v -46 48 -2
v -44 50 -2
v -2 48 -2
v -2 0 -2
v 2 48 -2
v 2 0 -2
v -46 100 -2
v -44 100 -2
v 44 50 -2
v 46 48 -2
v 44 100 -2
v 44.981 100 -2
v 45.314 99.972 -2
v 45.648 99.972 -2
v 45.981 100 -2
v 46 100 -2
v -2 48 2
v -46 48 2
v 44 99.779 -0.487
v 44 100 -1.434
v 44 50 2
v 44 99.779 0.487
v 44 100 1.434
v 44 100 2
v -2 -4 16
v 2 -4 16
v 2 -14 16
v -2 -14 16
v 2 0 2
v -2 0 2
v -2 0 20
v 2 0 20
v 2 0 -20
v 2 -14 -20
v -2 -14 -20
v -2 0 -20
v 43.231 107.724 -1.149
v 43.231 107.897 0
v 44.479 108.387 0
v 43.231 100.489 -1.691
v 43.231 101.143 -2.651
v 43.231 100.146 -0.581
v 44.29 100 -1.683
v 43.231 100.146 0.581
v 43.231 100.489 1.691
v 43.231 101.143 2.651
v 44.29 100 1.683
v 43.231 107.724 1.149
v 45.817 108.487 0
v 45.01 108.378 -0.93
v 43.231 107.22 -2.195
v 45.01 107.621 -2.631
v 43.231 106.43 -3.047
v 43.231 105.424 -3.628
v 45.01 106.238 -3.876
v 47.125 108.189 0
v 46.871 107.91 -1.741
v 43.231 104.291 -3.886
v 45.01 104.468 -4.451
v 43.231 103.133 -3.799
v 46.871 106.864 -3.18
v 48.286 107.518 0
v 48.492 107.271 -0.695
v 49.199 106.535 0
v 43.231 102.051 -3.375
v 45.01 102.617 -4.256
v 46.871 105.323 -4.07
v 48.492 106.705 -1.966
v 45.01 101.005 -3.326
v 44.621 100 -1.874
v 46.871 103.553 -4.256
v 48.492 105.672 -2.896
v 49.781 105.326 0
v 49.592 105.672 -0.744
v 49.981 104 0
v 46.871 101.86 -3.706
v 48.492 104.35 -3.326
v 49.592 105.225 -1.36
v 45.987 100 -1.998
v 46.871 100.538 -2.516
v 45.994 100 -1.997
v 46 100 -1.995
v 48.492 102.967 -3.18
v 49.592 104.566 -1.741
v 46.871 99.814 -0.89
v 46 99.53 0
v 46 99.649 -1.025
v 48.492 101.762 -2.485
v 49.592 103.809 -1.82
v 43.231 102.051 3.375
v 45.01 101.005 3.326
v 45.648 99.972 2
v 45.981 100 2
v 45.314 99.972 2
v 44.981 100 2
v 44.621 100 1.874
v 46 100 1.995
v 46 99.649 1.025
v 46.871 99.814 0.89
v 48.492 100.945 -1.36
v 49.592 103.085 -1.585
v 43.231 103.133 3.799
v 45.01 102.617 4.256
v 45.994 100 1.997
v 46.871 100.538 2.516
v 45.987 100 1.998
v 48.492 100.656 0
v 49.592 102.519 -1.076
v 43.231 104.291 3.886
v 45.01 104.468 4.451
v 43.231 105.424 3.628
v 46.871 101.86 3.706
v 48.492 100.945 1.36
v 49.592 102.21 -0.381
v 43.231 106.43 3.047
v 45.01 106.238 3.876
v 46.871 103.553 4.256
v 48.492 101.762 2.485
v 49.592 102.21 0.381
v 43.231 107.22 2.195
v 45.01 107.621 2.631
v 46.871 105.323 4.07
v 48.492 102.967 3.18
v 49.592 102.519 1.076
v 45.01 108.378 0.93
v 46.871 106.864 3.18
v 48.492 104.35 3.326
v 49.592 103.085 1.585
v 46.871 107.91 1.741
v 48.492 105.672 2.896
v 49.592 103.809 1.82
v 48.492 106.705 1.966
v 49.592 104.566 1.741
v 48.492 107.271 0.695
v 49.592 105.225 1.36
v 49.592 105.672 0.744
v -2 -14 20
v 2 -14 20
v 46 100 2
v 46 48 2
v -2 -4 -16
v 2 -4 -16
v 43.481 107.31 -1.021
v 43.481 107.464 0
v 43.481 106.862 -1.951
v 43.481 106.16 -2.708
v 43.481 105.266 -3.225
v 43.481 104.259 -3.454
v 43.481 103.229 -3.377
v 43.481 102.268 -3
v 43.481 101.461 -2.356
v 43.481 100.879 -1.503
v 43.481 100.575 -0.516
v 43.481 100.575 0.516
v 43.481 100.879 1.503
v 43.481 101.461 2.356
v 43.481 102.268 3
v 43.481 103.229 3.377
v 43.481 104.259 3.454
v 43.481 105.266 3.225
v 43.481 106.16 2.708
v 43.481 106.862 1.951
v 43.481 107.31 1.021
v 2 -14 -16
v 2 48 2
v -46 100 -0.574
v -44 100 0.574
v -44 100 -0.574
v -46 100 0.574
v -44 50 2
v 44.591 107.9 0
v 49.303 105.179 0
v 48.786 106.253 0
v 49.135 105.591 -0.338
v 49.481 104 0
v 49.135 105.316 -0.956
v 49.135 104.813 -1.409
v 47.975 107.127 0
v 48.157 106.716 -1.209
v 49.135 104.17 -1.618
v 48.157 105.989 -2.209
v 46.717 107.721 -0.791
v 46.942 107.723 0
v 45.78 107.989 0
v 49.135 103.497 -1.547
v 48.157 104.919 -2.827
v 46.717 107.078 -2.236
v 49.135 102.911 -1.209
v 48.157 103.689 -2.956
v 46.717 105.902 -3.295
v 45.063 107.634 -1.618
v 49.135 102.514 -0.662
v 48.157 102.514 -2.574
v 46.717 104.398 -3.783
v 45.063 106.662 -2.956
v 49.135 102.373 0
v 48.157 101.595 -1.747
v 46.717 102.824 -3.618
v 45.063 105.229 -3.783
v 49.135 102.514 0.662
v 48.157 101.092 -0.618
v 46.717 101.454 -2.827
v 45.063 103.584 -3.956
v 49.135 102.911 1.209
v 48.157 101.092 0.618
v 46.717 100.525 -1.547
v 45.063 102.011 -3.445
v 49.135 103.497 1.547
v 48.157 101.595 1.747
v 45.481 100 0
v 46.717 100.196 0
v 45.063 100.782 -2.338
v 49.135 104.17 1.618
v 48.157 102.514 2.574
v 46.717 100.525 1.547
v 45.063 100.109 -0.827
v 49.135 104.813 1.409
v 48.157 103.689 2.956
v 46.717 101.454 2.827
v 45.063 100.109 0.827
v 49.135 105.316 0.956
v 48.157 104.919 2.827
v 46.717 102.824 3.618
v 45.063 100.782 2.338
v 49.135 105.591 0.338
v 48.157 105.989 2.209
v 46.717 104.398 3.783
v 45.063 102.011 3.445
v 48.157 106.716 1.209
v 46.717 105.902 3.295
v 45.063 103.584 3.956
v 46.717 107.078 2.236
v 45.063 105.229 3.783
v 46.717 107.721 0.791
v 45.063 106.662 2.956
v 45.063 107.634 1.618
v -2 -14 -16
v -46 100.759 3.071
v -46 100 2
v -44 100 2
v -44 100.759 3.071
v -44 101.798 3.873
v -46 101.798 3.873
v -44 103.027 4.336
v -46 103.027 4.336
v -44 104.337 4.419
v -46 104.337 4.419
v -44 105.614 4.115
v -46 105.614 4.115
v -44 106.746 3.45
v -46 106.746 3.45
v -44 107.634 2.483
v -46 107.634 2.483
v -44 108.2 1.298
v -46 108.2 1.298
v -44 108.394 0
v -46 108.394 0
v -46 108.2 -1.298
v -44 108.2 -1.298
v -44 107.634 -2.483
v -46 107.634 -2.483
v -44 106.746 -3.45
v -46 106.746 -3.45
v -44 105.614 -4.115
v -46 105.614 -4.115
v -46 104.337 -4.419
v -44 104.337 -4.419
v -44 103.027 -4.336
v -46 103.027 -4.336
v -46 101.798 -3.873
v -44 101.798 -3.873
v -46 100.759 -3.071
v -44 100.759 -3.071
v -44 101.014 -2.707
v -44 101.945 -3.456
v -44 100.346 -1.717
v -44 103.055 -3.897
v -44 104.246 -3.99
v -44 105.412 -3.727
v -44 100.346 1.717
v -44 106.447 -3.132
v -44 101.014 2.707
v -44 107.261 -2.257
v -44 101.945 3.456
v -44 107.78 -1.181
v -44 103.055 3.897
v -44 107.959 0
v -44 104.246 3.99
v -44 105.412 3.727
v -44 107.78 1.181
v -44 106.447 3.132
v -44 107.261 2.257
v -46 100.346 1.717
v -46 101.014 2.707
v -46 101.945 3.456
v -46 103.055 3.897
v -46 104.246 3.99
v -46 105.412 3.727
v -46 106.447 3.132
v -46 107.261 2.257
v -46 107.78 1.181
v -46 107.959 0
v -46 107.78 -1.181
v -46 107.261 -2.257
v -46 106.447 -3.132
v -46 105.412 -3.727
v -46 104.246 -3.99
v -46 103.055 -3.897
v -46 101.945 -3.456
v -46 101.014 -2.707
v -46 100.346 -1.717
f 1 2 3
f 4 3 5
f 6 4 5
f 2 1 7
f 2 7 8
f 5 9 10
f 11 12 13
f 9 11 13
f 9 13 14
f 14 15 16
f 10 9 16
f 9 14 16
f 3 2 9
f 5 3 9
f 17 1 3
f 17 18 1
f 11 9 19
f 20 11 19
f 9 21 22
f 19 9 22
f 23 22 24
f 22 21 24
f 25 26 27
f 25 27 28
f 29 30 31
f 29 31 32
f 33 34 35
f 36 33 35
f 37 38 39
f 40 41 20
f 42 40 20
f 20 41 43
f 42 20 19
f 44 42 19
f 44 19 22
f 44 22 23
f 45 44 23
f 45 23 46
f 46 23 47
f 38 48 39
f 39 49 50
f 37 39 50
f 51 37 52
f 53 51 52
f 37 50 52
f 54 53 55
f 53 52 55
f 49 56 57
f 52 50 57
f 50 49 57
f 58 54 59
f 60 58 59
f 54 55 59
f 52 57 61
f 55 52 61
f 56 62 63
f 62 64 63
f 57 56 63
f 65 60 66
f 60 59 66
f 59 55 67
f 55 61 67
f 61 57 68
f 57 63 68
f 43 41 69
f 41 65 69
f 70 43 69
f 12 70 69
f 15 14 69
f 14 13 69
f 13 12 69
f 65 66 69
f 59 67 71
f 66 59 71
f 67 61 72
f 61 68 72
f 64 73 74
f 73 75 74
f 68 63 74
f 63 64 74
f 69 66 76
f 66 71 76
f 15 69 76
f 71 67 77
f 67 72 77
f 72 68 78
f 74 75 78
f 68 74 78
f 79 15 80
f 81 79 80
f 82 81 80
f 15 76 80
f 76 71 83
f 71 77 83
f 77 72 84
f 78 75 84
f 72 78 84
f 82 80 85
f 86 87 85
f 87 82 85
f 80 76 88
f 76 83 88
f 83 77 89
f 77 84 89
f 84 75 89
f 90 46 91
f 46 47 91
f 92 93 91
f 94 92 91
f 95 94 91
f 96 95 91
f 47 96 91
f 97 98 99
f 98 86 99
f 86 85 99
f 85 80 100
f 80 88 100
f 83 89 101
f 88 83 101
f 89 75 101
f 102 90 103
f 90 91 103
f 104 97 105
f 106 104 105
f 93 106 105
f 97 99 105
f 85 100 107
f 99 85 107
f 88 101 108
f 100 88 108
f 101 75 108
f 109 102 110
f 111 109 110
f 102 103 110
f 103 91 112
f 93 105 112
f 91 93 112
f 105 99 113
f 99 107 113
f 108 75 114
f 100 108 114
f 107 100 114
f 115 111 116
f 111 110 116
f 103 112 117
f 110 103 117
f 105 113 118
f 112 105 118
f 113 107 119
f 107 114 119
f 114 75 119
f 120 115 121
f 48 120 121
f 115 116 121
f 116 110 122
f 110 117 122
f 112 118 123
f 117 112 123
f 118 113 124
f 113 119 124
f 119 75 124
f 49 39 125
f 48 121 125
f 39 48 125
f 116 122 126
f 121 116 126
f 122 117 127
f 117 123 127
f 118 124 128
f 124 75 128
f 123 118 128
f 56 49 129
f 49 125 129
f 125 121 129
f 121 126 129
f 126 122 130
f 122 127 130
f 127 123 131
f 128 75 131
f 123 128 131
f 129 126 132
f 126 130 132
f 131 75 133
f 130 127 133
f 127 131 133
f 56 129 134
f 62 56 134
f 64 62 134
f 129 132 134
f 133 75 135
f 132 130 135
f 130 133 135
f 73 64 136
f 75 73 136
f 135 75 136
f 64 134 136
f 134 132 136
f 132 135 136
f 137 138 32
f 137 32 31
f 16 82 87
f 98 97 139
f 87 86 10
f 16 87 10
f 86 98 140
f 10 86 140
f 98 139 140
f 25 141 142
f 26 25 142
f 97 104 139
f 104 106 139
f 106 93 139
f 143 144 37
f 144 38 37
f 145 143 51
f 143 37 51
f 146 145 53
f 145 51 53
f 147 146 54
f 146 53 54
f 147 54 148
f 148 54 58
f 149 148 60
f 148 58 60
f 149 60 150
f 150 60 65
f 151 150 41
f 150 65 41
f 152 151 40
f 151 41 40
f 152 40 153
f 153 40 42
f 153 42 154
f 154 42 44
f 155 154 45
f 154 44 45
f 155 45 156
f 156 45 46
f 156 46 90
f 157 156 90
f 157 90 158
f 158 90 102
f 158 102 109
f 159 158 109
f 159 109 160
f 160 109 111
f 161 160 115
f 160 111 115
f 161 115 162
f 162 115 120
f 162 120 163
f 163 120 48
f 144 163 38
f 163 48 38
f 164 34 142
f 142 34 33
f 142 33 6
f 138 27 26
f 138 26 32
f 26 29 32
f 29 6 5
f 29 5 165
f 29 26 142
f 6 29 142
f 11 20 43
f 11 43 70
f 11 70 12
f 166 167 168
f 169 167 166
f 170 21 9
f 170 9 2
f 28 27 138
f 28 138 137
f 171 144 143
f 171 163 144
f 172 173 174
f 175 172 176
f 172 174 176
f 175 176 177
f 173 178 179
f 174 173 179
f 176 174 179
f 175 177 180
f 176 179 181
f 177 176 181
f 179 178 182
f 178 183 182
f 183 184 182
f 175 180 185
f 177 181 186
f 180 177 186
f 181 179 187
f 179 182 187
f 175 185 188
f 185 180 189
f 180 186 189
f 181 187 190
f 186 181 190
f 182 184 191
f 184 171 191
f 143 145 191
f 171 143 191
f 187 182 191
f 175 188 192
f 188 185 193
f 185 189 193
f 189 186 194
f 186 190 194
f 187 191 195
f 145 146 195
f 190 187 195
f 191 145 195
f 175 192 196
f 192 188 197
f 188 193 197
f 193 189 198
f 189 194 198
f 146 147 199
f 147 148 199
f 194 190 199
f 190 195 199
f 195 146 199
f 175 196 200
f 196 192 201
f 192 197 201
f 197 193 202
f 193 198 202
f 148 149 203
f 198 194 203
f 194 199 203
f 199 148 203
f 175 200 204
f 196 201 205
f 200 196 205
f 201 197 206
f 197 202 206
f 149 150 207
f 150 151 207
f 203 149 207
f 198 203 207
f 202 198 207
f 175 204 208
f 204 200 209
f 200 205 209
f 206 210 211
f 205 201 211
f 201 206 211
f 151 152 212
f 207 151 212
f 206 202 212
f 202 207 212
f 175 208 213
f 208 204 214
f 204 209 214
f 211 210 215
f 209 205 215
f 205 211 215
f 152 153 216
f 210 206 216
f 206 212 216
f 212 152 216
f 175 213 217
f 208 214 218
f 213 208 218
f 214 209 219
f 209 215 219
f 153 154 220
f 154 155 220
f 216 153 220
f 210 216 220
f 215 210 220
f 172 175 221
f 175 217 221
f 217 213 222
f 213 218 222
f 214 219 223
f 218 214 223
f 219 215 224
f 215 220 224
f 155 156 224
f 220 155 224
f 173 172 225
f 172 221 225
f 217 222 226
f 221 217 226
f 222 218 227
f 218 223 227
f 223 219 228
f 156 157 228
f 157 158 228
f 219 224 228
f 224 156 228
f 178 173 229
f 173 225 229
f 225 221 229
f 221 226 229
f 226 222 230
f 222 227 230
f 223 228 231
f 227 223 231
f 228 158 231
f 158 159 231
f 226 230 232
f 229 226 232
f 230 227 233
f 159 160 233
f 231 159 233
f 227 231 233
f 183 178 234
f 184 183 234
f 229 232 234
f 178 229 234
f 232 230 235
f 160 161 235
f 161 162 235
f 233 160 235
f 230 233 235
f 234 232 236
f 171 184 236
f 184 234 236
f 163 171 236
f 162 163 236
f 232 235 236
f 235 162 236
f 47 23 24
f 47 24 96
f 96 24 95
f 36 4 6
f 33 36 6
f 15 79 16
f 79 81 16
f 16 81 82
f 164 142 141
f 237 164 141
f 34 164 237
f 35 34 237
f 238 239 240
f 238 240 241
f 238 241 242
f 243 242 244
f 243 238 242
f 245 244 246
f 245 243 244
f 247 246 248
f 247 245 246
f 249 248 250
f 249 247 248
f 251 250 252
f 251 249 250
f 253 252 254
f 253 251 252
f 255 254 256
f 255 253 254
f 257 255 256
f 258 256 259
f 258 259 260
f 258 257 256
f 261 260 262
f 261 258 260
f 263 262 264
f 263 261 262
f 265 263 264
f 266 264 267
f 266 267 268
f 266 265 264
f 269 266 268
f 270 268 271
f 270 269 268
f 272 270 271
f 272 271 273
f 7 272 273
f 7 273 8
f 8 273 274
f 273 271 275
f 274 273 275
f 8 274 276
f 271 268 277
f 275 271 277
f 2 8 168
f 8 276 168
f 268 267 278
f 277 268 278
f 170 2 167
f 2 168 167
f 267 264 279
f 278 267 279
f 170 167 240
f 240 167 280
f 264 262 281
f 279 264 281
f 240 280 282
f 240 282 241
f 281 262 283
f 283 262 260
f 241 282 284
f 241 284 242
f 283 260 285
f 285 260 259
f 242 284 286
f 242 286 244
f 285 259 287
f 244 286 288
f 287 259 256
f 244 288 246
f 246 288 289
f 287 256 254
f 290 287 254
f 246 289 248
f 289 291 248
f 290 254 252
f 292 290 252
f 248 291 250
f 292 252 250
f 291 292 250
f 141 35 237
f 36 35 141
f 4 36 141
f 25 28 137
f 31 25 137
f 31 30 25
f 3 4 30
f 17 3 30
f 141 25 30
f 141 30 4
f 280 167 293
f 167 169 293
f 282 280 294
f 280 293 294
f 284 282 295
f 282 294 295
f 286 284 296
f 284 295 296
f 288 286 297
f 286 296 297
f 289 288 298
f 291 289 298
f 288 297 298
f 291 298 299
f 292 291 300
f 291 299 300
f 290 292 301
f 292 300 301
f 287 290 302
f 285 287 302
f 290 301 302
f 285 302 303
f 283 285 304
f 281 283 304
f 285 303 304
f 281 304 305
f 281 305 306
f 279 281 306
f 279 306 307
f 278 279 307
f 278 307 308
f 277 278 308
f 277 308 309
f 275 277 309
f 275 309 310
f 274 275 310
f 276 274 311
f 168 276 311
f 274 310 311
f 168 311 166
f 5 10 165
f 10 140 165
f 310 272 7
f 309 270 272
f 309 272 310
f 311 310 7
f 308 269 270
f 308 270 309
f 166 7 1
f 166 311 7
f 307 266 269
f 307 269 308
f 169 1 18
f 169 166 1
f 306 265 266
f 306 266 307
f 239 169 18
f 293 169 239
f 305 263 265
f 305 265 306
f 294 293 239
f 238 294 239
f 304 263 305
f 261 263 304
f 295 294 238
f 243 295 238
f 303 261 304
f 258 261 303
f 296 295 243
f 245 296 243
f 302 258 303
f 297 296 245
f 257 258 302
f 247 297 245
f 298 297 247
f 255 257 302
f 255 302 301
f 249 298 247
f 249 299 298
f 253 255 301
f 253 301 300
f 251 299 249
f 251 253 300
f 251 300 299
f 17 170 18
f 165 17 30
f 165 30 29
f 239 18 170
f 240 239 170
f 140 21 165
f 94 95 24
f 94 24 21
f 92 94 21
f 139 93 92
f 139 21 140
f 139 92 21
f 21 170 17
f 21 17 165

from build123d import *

# Parameters (mm, degrees)
BOSS_EXTRU_1_DEPTH = 2
ESQUISSE3_W        = 4
ESQUISSE3_H        = 4
BOSS_EXTRU_2_DEPTH = 20
ESQUISSE4_W        = 4
ESQUISSE4_H        = 4
BOSS_EXTRU_3_DEPTH = 10
ESQUISSE5_R        = 4.435199719
ESQUISSE5_R_2      = 4
BOSS_EXTRU_4_DEPTH = 2


with BuildPart() as part:
    # Esquisse1 → Boss.-Extru.1 (new body, symmetric)
    with BuildSketch(Plane.XY):
        Polygon((0, 0), (0, 50), (44, 50), (44, 100), (46, 100), (46, 48), (2, 48), (2, 0), align=None)
    boss_extru_1 = extrude(amount=BOSS_EXTRU_1_DEPTH, both=True)

    # Esquisse2 → Révolution1 (revolve)
    with BuildSketch(Plane.XY):
        with BuildLine():
            Line((43.480681174, 107.464101615), (43.230681174, 107.897114317))
            ThreePointArc((43.230681174, 107.897114317), (47.730681174, 107.897114317), (49.980681174, 104))
            Line((49.980681174, 104), (49.480681174, 104))
            ThreePointArc((49.480681174, 104), (47.480681174, 107.464101615), (43.480681174, 107.464101615))
        make_face()
    revolve(axis=Axis((49.980681174, 104, 0), (-1, 0, 0)))

    # Symétrie1: Boss.-Extru.1 across plane
    add(boss_extru_1.mirror(Plane(origin=(0, 0, -2), x_dir=(0, 0, 1), z_dir=(-1, 0, 0))))

    # Esquisse3 → Boss.-Extru.2 (add)
    with BuildSketch(Plane.XY):
        with Locations((0, -2)):
            Rectangle(ESQUISSE3_W, ESQUISSE3_H)
    boss_extru_2 = extrude(amount=BOSS_EXTRU_2_DEPTH)

    # Esquisse4 → Boss.-Extru.3 (add)
    with BuildSketch(Plane(origin=(0, -4, 0), x_dir=(-1, 0, 0), z_dir=(0, -1, 0))):
        with Locations((0, -18)):
            Rectangle(ESQUISSE4_W, ESQUISSE4_H)
    boss_extru_3 = extrude(amount=BOSS_EXTRU_3_DEPTH)

    # Symétrie2: Boss.-Extru.2, Boss.-Extru.3 across plane
    add(boss_extru_2.mirror(Plane(origin=(0, 0, 0), x_dir=(1, 0, 0), z_dir=(0, 0, -1))))
    add(boss_extru_3.mirror(Plane(origin=(0, 0, 0), x_dir=(1, 0, 0), z_dir=(0, 0, -1))))

    # Esquisse5 → Boss.-Extru.4 (add)
    with BuildSketch(Plane.ZY.offset(46)):
        with Locations((0, 103.958660954)):
            Circle(ESQUISSE5_R)
        with Locations((0, 103.958660954)):
            Circle(ESQUISSE5_R_2, mode=Mode.SUBTRACT)
    extrude(amount=-BOSS_EXTRU_4_DEPTH)


solid = part.part
